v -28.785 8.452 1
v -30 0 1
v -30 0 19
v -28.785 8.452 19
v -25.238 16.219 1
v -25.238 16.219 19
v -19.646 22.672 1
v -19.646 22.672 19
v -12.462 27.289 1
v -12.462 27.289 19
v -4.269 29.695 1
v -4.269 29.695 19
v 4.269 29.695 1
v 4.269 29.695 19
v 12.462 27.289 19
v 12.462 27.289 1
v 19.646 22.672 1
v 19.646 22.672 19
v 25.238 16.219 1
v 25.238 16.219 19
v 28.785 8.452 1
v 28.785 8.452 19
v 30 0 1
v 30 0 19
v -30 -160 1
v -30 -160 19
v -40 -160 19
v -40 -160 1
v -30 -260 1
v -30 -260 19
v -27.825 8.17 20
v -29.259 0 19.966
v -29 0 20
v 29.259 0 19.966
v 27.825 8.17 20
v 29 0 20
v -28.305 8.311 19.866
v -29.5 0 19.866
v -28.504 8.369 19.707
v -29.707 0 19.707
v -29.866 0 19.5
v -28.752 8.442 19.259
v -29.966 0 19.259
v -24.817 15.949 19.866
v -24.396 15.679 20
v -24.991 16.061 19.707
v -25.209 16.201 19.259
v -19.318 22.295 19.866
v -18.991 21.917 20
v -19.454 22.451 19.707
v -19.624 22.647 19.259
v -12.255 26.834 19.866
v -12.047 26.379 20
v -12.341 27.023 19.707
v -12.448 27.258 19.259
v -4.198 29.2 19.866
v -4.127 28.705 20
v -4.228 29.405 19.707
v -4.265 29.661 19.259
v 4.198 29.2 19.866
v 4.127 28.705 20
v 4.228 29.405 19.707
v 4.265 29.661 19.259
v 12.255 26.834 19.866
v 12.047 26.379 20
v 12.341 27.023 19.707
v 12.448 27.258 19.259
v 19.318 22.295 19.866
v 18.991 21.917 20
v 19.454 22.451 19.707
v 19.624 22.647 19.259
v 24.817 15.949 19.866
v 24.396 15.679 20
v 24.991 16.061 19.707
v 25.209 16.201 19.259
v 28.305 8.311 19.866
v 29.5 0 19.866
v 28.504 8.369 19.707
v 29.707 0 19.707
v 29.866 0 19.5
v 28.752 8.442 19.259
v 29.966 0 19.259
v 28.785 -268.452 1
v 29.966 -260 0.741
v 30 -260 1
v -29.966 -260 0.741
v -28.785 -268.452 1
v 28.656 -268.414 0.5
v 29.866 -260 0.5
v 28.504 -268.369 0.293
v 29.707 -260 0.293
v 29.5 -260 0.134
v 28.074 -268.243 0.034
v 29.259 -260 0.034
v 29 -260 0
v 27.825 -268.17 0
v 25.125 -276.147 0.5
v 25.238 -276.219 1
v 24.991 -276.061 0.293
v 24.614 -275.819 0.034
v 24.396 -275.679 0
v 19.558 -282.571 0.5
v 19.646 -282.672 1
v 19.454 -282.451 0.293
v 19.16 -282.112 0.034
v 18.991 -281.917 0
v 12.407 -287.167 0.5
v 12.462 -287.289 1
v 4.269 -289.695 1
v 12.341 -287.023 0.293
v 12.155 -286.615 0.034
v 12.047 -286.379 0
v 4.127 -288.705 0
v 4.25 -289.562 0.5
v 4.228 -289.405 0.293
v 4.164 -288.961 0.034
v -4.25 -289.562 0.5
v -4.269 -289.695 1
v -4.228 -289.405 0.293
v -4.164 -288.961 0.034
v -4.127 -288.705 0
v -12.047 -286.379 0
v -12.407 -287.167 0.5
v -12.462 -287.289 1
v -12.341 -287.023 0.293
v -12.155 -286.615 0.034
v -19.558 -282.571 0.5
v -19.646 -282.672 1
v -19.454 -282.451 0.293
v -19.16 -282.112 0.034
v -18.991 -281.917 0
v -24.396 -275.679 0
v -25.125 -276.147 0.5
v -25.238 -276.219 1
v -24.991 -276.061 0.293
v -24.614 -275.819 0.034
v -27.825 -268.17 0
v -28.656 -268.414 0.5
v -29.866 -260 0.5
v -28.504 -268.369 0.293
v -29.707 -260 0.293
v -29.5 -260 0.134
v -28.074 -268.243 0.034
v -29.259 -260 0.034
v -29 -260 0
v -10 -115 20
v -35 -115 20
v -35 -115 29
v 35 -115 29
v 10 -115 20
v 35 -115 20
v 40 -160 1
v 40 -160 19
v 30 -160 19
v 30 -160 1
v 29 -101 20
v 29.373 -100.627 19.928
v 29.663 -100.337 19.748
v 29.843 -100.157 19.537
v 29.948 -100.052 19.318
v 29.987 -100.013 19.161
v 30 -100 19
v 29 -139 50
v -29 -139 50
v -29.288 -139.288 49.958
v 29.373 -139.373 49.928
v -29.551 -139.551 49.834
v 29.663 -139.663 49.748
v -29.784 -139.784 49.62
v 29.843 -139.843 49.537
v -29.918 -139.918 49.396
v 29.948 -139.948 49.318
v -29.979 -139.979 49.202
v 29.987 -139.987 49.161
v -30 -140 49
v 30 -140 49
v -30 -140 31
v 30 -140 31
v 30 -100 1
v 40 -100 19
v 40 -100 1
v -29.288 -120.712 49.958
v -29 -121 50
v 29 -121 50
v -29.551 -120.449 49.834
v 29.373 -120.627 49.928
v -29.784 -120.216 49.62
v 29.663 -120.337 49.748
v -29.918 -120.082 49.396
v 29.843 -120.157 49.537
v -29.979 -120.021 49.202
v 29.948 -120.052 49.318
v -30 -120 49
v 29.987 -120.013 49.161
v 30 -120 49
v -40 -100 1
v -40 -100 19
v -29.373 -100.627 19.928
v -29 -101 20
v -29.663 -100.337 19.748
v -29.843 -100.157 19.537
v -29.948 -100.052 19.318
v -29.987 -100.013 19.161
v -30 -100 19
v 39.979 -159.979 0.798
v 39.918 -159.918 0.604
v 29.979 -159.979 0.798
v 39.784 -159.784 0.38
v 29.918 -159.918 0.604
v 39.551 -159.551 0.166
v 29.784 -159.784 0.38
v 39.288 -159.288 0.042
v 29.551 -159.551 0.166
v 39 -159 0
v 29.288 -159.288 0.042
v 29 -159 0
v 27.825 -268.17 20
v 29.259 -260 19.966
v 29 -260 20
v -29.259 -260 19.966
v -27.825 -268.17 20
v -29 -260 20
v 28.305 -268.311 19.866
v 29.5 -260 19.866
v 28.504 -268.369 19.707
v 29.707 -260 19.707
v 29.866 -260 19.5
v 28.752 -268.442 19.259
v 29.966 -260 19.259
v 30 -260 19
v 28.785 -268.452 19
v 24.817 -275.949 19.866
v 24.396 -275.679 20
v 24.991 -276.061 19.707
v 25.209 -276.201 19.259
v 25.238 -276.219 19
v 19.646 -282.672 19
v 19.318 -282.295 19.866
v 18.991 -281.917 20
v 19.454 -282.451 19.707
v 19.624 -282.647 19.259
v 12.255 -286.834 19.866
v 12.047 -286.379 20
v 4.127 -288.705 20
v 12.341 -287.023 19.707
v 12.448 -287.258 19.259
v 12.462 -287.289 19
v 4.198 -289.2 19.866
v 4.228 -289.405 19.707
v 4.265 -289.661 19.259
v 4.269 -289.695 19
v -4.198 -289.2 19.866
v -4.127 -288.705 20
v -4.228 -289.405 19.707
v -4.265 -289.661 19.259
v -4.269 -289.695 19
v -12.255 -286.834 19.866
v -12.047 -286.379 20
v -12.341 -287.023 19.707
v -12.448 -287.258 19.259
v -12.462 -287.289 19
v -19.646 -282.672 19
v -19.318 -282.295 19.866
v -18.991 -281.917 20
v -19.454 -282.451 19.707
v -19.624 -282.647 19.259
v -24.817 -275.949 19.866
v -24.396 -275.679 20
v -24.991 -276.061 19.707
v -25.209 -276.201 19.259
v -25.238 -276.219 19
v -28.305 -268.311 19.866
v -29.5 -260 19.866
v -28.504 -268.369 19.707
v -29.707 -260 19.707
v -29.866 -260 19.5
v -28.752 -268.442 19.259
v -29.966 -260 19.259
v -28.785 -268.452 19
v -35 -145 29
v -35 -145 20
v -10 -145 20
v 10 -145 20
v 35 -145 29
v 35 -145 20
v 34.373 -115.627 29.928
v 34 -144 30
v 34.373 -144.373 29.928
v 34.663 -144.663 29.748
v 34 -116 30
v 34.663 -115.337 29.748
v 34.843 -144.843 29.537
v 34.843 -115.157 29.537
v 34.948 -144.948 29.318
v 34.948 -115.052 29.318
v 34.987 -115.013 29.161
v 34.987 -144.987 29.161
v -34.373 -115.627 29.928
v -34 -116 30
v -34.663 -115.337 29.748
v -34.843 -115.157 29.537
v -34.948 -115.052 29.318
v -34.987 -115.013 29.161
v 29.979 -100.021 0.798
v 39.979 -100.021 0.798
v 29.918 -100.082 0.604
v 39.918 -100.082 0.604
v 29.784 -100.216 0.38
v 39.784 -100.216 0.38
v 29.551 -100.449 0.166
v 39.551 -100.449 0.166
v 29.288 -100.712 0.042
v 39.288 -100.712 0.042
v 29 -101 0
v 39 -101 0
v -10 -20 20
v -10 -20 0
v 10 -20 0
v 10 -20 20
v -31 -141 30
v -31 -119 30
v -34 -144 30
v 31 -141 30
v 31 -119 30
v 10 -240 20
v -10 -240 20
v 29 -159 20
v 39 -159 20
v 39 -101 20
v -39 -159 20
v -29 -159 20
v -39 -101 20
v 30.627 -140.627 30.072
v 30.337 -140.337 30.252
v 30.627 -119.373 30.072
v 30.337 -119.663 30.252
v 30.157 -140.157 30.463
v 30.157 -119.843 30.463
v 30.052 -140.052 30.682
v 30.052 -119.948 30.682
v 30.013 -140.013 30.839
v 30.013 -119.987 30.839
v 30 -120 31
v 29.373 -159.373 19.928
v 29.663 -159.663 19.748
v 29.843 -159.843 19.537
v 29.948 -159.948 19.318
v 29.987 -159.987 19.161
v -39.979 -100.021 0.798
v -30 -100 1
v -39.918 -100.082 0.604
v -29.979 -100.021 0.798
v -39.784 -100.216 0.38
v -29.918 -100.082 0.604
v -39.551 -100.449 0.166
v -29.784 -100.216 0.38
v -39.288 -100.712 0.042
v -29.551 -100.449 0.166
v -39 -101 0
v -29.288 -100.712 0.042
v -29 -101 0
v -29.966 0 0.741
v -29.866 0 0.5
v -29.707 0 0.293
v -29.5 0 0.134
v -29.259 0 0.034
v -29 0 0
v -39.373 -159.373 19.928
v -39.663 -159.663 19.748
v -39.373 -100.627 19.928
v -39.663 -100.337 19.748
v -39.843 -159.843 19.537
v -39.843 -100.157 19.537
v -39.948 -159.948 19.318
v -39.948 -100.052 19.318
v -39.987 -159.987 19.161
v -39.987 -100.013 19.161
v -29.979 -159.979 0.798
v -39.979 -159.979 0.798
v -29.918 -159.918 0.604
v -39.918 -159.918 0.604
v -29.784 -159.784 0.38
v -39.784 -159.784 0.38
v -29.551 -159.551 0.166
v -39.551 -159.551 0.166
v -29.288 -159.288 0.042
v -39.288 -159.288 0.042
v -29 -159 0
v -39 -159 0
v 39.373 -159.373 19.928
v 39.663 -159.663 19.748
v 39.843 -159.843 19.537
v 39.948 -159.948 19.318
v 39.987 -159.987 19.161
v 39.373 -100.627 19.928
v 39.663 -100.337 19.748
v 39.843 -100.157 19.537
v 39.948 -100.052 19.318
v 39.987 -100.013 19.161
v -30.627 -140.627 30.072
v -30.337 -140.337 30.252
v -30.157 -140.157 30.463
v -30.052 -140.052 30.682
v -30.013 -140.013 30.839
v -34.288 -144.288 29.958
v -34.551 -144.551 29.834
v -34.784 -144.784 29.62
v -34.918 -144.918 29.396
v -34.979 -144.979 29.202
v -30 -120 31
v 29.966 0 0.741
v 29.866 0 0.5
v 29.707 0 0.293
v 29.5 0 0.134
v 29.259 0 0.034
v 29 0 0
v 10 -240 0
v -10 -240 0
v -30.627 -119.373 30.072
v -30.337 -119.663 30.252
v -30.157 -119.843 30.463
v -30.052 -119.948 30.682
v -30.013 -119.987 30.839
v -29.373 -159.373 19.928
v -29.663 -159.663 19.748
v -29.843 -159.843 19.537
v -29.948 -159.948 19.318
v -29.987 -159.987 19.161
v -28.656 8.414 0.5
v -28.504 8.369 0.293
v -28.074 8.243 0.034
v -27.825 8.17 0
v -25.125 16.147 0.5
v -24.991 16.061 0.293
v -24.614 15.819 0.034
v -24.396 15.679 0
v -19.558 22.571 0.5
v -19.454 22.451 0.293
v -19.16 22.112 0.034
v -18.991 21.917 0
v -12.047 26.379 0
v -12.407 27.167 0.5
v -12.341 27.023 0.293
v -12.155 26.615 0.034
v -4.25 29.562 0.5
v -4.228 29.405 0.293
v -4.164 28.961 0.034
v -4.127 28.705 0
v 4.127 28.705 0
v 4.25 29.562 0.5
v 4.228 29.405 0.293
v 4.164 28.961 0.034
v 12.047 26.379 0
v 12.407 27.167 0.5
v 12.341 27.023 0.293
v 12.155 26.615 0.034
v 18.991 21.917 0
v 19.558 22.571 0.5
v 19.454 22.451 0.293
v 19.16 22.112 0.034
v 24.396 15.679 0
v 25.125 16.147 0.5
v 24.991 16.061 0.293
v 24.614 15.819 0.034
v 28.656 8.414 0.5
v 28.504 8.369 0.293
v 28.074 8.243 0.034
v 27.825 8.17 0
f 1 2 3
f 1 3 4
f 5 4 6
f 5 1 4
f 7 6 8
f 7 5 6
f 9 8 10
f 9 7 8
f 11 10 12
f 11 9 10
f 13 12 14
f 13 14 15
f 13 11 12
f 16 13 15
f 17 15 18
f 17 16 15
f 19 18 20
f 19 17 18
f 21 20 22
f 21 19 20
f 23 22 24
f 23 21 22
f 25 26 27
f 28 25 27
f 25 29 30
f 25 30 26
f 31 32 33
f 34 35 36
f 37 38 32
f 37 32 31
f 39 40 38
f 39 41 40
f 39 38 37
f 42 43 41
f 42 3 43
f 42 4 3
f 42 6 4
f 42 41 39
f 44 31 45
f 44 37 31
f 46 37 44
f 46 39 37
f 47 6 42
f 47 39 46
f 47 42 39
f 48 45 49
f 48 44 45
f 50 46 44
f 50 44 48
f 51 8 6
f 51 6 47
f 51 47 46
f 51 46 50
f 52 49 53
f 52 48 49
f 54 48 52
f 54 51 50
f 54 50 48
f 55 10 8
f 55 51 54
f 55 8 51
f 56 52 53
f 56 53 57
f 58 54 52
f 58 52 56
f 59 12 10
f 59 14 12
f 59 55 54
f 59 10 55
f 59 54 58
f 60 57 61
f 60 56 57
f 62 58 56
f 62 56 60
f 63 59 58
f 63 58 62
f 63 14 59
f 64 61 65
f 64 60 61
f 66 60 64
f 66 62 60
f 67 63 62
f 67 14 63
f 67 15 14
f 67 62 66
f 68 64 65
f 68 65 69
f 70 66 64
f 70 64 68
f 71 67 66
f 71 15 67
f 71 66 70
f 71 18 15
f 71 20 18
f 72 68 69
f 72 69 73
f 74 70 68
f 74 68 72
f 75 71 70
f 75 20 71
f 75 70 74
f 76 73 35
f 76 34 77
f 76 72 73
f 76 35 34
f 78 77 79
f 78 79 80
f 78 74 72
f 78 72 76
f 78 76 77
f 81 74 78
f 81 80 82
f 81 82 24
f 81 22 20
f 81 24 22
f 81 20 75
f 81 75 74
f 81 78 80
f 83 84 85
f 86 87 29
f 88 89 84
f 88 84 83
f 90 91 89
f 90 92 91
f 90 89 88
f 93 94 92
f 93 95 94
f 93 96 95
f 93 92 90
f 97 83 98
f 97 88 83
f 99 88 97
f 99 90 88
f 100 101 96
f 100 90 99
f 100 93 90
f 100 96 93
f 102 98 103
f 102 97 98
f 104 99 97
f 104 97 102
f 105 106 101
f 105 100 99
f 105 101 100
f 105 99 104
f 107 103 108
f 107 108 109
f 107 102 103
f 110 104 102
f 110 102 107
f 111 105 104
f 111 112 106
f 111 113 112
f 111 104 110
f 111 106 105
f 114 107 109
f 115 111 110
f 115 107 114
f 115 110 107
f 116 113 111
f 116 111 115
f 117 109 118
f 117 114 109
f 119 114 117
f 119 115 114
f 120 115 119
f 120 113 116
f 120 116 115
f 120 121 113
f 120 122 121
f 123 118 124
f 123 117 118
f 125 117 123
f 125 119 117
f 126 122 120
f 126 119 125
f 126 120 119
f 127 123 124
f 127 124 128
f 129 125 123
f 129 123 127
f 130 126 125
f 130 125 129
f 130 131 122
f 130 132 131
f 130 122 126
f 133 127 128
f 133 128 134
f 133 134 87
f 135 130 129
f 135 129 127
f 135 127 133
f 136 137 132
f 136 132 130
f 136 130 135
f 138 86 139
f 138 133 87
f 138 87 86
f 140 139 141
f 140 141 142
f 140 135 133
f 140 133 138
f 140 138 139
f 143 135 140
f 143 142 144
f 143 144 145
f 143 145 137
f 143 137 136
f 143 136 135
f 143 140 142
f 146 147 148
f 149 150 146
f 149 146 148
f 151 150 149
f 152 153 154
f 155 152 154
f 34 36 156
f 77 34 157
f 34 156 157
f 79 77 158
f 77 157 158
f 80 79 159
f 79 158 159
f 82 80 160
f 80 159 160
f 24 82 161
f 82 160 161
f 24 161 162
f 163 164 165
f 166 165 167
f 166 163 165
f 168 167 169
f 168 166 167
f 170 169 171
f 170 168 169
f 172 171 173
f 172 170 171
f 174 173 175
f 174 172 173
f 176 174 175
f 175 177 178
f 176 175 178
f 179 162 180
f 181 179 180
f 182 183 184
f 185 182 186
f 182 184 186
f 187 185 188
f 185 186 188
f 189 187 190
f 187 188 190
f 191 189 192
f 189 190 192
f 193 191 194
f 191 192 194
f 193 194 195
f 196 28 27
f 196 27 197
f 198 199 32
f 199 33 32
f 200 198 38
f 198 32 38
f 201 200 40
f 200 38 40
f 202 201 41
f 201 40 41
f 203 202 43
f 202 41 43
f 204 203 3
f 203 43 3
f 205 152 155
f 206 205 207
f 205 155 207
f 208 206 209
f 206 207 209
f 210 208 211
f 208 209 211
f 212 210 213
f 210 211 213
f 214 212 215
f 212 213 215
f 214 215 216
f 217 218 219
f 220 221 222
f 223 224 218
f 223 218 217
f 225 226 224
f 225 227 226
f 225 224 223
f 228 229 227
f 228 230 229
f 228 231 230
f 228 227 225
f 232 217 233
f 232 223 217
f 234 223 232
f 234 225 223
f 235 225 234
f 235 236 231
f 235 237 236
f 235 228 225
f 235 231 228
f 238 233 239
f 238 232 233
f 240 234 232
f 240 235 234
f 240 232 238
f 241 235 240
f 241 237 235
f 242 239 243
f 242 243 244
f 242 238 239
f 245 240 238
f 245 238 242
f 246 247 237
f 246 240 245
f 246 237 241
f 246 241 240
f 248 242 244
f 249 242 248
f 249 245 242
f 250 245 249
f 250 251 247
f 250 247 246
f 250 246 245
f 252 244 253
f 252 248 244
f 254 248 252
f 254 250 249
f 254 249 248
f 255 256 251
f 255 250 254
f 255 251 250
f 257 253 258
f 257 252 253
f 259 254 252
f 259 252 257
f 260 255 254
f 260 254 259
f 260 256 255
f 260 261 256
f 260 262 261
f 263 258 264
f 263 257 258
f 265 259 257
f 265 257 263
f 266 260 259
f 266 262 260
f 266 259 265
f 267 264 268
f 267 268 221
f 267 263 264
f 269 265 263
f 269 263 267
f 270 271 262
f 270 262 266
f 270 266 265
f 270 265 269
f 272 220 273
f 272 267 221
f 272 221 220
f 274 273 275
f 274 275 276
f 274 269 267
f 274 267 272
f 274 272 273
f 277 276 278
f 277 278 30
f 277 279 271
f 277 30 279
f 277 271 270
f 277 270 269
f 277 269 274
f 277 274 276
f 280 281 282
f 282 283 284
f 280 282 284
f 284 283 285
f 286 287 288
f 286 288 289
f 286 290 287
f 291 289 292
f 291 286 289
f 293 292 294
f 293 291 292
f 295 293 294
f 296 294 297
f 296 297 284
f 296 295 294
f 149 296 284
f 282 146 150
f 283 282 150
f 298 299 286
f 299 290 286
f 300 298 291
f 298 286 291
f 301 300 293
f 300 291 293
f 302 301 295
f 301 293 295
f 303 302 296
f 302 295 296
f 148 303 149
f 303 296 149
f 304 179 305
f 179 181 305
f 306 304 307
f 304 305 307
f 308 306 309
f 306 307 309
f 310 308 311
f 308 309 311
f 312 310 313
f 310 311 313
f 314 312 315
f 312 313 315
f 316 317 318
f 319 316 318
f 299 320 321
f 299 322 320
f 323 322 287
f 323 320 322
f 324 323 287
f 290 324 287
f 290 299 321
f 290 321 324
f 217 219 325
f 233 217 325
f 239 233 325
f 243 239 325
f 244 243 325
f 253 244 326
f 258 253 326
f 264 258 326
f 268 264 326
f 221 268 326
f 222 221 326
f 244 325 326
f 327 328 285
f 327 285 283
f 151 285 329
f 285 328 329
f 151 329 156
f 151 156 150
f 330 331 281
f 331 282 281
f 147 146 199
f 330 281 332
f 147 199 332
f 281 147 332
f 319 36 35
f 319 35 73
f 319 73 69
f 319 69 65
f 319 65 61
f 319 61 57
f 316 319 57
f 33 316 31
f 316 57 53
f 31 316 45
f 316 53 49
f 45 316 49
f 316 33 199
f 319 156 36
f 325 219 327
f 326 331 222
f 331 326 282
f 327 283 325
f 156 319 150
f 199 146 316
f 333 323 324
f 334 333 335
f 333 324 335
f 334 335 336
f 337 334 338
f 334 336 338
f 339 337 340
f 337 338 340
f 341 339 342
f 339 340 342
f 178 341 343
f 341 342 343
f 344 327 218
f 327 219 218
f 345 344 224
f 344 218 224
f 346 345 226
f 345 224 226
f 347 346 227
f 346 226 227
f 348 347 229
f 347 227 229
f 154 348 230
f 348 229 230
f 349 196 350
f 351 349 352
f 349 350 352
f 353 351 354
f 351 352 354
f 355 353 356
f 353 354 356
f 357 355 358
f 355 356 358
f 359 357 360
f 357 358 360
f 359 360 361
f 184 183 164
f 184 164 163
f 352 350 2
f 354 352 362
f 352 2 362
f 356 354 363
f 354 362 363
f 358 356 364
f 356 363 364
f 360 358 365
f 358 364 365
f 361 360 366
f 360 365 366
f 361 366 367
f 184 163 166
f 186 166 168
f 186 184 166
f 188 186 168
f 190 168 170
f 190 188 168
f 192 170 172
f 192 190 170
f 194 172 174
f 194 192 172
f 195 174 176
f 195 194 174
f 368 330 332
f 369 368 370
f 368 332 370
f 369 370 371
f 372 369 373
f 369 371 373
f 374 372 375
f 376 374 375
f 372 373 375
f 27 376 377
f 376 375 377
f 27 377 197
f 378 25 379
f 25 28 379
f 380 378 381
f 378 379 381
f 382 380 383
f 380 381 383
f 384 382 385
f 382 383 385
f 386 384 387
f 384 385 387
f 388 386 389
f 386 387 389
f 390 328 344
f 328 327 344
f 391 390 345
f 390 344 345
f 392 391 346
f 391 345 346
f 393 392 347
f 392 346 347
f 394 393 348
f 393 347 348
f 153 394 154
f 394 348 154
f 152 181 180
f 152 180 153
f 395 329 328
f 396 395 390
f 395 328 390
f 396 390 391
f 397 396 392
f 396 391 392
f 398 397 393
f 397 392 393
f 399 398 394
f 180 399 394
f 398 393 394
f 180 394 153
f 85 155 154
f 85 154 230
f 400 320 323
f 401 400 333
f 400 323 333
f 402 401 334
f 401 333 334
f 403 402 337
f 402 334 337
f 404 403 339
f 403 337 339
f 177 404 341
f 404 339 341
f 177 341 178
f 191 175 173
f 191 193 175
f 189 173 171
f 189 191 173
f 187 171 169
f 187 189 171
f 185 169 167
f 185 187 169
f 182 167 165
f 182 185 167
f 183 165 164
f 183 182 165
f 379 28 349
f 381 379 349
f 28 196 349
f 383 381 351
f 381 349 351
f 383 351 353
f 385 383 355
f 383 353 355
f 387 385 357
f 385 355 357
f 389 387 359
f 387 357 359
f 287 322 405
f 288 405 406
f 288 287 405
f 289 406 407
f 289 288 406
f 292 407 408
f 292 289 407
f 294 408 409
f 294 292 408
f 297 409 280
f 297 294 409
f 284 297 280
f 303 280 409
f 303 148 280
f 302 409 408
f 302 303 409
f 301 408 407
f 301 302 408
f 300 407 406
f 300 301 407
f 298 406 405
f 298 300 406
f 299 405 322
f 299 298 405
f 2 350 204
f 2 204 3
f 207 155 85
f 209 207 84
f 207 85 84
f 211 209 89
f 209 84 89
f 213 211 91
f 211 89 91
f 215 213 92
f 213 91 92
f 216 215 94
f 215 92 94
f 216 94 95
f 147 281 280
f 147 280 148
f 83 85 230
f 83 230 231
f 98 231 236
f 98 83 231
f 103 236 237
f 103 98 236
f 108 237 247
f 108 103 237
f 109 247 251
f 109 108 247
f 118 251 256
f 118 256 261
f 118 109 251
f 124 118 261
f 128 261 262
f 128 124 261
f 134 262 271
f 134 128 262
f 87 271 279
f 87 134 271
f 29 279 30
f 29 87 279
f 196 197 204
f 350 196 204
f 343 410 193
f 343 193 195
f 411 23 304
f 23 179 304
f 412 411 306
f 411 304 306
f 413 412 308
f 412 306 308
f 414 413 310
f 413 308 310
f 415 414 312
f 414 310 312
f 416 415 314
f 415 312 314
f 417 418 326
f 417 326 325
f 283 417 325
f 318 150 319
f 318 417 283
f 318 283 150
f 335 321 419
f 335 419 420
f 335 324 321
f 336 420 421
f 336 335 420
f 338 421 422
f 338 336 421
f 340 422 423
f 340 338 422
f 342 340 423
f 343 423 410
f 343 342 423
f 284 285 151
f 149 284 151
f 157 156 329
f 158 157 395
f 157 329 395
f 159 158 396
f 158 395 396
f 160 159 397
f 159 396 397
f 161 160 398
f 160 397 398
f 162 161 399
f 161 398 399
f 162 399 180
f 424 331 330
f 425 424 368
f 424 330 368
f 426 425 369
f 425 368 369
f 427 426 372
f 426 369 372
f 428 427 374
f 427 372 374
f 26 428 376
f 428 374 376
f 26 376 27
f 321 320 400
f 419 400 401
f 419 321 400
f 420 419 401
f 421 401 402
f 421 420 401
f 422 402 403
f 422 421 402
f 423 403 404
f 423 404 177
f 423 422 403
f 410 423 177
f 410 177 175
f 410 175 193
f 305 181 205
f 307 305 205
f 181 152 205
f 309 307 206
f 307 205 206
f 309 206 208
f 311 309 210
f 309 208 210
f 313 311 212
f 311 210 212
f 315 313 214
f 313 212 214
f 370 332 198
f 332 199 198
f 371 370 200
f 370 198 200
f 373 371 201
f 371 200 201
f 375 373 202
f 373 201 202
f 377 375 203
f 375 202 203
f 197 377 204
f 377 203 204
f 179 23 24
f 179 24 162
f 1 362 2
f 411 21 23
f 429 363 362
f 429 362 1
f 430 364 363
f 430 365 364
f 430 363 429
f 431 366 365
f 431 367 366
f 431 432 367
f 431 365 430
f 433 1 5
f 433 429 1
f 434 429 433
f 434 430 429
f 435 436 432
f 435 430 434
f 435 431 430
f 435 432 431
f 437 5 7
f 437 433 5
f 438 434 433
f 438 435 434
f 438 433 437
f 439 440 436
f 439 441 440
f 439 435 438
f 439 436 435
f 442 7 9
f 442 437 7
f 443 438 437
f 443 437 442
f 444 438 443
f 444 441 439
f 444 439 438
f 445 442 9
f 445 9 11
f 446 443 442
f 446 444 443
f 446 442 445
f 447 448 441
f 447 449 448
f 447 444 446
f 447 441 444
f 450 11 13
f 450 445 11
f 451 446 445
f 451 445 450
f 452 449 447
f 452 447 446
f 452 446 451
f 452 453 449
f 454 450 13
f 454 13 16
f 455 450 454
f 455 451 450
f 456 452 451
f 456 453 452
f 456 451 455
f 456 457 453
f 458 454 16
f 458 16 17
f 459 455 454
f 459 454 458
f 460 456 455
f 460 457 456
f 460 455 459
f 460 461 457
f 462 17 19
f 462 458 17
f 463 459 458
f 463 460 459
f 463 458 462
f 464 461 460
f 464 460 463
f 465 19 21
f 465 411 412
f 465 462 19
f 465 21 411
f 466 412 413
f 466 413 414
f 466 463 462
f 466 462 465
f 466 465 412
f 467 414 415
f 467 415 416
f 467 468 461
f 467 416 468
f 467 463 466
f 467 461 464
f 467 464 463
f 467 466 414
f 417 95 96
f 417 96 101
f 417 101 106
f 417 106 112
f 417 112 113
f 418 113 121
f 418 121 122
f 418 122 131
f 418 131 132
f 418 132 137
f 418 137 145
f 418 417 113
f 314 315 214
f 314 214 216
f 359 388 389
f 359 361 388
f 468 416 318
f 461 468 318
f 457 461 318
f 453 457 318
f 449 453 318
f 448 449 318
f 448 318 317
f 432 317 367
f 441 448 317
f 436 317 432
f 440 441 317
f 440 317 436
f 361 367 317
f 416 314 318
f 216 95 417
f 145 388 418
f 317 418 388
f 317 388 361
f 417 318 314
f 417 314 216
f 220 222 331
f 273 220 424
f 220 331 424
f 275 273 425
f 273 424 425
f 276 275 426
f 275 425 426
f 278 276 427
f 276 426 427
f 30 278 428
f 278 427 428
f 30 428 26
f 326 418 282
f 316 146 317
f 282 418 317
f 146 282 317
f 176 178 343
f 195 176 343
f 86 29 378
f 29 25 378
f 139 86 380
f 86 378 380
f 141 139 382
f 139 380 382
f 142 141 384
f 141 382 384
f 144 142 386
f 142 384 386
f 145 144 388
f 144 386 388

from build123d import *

# Parameters (mm, degrees)
SKETCH1_W           = 20
SKETCH1_H           = 220
BOSS_EXTRUDE1_DEPTH = 20
SKETCH2_W           = 60
SKETCH2_H           = 20
BOSS_EXTRUDE2_DEPTH = 30
SKETCH3_W           = 70
SKETCH3_H           = 30
SKETCH3_W_2         = 60
SKETCH3_H_2         = 20
BOSS_EXTRUDE3_DEPTH = 10
FILLET1_R           = 1
FILLET2_R           = 1


with BuildPart() as part:
    # Sketch1 → Boss-Extrude1 (new body)
    with BuildSketch(Plane.XY):
        with BuildLine():
            Line((30, 0), (30, -100))
            Line((30, -100), (40, -100))
            Line((40, -100), (40, -160))
            Line((40, -160), (30, -160))
            Line((30, -160), (30, -260))
            ThreePointArc((30, -260), (0, -290), (-30, -260))
            Line((-30, -260), (-30, -160))
            Line((-30, -160), (-40, -160))
            Line((-40, -160), (-40, -100))
            Line((-40, -100), (-30, -100))
            Line((-30, -100), (-30, 0))
            ThreePointArc((-30, 0), (0, 30), (30, 0))
        make_face()
        with Locations((0, -130)):
            Rectangle(SKETCH1_W, SKETCH1_H, mode=Mode.SUBTRACT)
    extrude(amount=BOSS_EXTRUDE1_DEPTH)

    # Sketch2 → Boss-Extrude2 (add)
    with BuildSketch(Plane.XY.offset(20)):
        with Locations((0, -130)):
            Rectangle(SKETCH2_W, SKETCH2_H)
    extrude(amount=BOSS_EXTRUDE2_DEPTH)

    # Sketch3 → Boss-Extrude3 (add)
    with BuildSketch(Plane.XY.offset(20)):
        with Locations((0, -130)):
            Rectangle(SKETCH3_W, SKETCH3_H)
        with Locations((0, -130)):
            Rectangle(SKETCH3_W_2, SKETCH3_H_2, mode=Mode.SUBTRACT)
    extrude(amount=BOSS_EXTRUDE3_DEPTH)

    # Fillet1
    fillet1_edges = [part.edges().sort_by_distance(p)[0] for p in [
        (-30, -130, 50),
        (0, -140, 50),
        (30, -130, 50),
        (0, -120, 50),
        (35, -130, 30),
        (0, -115, 30),
        (-35, -130, 30),
        (0, -145, 30),
        (0, -120, 30),
        (-30, -130, 30),
        (0, -140, 30),
        (30, -130, 30),
    ]]
    fillet(fillet1_edges, radius=FILLET1_R)

    # Fillet2
    fillet2_edges = [part.edges().sort_by_distance(p)[0] for p in [
        (30, -50, 0),
        (35, -100, 0),
        (-35, -100, 20),
        (40, -130, 0),
        (35, -160, 0),
        (30, -210, 0),
        (0, -290, 0),
        (-30, -210, 0),
        (-35, -160, 0),
        (-40, -130, 0),
        (-35, -100, 0),
        (-30, -50, 0),
        (0, 30, 0),
        (-40, -130, 20),
        (-35, -160, 20),
        (-30, -210, 20),
        (0, -290, 20),
        (30, -210, 20),
        (35, -160, 20),
        (40, -130, 20),
        (35, -100, 20),
        (30, -50, 20),
        (0, 30, 20),
        (-30, -50, 20),
    ]]
    fillet(fillet2_edges, radius=FILLET2_R)


solid = part.part
